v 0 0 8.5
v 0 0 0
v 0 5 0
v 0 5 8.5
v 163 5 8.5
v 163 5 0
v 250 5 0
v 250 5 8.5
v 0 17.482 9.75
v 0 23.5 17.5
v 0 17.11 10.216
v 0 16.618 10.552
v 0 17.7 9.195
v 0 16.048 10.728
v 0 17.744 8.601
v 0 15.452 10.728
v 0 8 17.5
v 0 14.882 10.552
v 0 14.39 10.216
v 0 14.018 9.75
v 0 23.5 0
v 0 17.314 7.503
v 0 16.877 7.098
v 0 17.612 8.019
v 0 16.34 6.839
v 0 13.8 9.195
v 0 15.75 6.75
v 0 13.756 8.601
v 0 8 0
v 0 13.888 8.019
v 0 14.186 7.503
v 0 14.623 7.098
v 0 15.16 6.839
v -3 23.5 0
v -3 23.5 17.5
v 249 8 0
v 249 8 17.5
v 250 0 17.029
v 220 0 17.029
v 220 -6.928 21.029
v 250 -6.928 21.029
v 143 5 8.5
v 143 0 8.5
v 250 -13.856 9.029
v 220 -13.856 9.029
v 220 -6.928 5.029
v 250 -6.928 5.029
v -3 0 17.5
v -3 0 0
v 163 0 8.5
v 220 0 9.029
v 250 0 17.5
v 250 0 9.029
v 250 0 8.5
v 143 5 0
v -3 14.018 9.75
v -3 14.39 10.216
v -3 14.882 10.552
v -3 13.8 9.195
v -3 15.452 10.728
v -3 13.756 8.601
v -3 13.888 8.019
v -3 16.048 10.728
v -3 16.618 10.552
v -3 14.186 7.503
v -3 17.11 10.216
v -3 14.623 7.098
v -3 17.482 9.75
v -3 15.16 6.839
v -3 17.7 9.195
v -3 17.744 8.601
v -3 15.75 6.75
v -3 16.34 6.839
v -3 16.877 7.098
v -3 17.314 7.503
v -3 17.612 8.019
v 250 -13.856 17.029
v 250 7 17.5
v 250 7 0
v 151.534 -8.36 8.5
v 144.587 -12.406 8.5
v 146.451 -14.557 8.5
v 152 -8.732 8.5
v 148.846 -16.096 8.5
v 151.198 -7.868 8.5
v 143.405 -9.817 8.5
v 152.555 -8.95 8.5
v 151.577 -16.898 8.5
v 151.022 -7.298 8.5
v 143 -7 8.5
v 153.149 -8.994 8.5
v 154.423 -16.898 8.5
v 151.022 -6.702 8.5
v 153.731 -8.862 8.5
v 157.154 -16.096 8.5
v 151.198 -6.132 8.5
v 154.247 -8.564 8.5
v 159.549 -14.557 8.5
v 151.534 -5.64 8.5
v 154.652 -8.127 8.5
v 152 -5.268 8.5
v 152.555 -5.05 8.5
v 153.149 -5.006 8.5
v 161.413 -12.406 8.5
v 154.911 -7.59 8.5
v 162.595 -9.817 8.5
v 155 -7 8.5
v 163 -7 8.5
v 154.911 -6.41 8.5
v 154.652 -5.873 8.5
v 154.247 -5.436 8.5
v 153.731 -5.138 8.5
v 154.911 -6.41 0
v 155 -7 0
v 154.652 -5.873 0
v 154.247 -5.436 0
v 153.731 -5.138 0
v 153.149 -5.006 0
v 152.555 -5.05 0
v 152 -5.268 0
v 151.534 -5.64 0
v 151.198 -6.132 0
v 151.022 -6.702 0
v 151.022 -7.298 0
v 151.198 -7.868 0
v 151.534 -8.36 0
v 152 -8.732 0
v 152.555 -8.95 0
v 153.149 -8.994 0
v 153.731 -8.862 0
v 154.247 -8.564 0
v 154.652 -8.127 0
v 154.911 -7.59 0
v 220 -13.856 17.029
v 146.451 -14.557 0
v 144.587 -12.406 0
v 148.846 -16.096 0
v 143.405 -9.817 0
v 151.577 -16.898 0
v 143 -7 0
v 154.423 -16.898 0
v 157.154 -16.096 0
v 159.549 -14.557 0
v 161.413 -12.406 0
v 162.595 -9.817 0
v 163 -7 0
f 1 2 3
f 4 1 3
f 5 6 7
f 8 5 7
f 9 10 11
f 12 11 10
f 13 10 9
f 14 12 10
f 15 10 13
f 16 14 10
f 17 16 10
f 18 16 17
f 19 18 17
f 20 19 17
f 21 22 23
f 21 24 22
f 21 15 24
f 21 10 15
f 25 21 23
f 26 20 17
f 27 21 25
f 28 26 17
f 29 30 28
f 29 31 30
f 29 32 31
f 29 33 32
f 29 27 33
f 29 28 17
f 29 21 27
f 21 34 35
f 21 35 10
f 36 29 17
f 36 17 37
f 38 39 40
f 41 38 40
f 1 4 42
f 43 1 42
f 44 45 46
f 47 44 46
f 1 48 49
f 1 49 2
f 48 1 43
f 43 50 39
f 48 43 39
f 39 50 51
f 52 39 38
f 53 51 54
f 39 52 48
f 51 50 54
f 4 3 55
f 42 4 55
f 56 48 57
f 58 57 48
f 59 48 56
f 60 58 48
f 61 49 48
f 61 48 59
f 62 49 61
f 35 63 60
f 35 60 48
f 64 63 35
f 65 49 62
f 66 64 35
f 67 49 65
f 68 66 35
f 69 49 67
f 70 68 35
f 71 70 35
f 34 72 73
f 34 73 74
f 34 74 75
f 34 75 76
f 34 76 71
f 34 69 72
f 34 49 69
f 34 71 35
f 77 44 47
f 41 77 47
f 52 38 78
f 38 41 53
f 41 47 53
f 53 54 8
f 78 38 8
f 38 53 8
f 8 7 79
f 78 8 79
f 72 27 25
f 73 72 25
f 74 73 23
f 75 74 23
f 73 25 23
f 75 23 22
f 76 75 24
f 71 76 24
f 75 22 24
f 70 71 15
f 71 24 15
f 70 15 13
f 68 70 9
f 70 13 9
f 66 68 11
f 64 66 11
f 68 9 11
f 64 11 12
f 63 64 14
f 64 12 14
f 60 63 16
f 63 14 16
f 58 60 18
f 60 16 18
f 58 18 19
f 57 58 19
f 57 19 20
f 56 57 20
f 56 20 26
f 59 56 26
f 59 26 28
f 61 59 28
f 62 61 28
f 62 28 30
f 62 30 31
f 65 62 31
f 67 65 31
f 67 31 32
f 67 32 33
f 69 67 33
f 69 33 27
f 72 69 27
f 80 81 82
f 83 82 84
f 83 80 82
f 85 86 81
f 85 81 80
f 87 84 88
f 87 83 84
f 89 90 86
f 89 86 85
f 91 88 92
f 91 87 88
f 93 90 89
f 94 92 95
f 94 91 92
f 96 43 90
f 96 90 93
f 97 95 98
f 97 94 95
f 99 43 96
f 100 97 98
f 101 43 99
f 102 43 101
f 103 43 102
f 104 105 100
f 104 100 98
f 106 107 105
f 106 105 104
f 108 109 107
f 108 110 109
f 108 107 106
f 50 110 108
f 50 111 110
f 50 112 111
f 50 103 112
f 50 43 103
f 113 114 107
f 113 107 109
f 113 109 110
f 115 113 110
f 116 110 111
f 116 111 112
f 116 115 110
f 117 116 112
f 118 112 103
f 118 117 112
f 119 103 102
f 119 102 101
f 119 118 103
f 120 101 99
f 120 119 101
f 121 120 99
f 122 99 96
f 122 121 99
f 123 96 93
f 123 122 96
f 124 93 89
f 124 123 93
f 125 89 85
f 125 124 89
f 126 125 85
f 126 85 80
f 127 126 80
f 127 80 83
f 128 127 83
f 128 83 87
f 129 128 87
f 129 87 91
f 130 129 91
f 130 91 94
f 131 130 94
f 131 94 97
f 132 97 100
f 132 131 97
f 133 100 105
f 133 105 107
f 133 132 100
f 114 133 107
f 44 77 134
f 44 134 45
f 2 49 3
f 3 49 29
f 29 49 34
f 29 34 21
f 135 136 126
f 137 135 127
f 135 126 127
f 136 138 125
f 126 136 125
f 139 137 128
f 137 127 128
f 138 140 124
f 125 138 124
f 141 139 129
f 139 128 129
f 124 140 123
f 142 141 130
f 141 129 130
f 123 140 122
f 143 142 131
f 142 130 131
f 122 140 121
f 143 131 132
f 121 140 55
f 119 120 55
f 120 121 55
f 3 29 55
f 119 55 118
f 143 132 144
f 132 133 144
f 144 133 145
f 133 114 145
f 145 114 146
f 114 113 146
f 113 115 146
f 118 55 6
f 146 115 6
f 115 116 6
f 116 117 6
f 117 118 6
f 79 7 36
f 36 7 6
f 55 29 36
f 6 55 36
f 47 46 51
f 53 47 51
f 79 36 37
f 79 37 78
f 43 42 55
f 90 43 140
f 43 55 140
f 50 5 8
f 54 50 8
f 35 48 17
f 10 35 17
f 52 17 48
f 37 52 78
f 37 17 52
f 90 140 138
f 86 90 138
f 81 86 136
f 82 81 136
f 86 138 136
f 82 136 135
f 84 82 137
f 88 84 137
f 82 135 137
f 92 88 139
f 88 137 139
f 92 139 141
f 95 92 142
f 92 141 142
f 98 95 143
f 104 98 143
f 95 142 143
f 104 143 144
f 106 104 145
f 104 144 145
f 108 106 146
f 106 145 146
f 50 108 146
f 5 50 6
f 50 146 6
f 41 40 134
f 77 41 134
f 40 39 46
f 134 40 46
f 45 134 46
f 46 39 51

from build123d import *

# Parameters (mm, degrees)
SKETCH1_W           = 250
SKETCH1_H           = 5
SKETCH1_W_2         = 143
SKETCH1_W_3         = 87
BOSS_EXTRUDE1_DEPTH = 17.5
SKETCH1_3_W         = 250
SKETCH1_3_H         = 5
CUT_EXTRUDE1_DEPTH  = 8.5
SKETCH2_R           = 2
CUT_EXTRUDE2_DEPTH  = 8.5
SKETCH1_5_R         = 2
BOSS_EXTRUDE2_DEPTH = 8.5
BOSS_EXTRUDE3_DEPTH = 30


with BuildPart() as part:
    # Sketch1 → Boss-Extrude1 (new body)
    with BuildSketch(Plane.XY):
        with Locations((125, 2.5)):
            Rectangle(SKETCH1_W, SKETCH1_H)
        Polygon((249, 8), (250, 7), (250, 5), (0, 5), (0, 8), align=None)
        Polygon((0, 23.5), (0, 8), (0, 5), (0, 0), (-3, 0), (-3, 23.5), align=None)
        with Locations((71.5, 2.5)):
            Rectangle(SKETCH1_W_2, SKETCH1_H)
        with Locations((206.5, 2.5)):
            Rectangle(SKETCH1_W_3, SKETCH1_H)
    extrude(amount=BOSS_EXTRUDE1_DEPTH)

    # Sketch1_3 → Cut-Extrude1 (cut)
    with BuildSketch(Plane.XY):
        with Locations((125, 2.5)):
            Rectangle(SKETCH1_3_W, SKETCH1_3_H)
    extrude(amount=CUT_EXTRUDE1_DEPTH, mode=Mode.SUBTRACT)

    # Sketch2 → Cut-Extrude2 (cut)
    with BuildSketch(Plane(origin=(0, 0, 0), x_dir=(0, 0, -1), z_dir=(1, 0, 0))):
        with Locations((-8.75, 15.75)):
            Circle(SKETCH2_R)
    extrude(amount=-CUT_EXTRUDE2_DEPTH, mode=Mode.SUBTRACT)

    # Sketch1_5 → Boss-Extrude2 (add)
    with BuildSketch(Plane.XY):
        with BuildLine():
            Line((163, 5), (143, 5))
            Line((143, 5), (143, -7))
            ThreePointArc((143, -7), (153, -17), (163, -7))
            Line((163, -7), (163, 5))
        make_face()
        with Locations((153, -7)):
            Circle(SKETCH1_5_R, mode=Mode.SUBTRACT)
    extrude(amount=BOSS_EXTRUDE2_DEPTH)

    # Sketch4 → Boss-Extrude3 (add)
    with BuildSketch(Plane(origin=(250, 0, 0), x_dir=(0, 0, -1), z_dir=(1, 0, 0))):
        Polygon((-5.029428908, -6.92820323), (-9.029428908, 0), (-17.029428908, 0), (-21.029428908, -6.92820323), (-17.029428908, -13.856406461), (-9.029428908, -13.856406461), align=None)
    extrude(amount=-BOSS_EXTRUDE3_DEPTH)


solid = part.part
